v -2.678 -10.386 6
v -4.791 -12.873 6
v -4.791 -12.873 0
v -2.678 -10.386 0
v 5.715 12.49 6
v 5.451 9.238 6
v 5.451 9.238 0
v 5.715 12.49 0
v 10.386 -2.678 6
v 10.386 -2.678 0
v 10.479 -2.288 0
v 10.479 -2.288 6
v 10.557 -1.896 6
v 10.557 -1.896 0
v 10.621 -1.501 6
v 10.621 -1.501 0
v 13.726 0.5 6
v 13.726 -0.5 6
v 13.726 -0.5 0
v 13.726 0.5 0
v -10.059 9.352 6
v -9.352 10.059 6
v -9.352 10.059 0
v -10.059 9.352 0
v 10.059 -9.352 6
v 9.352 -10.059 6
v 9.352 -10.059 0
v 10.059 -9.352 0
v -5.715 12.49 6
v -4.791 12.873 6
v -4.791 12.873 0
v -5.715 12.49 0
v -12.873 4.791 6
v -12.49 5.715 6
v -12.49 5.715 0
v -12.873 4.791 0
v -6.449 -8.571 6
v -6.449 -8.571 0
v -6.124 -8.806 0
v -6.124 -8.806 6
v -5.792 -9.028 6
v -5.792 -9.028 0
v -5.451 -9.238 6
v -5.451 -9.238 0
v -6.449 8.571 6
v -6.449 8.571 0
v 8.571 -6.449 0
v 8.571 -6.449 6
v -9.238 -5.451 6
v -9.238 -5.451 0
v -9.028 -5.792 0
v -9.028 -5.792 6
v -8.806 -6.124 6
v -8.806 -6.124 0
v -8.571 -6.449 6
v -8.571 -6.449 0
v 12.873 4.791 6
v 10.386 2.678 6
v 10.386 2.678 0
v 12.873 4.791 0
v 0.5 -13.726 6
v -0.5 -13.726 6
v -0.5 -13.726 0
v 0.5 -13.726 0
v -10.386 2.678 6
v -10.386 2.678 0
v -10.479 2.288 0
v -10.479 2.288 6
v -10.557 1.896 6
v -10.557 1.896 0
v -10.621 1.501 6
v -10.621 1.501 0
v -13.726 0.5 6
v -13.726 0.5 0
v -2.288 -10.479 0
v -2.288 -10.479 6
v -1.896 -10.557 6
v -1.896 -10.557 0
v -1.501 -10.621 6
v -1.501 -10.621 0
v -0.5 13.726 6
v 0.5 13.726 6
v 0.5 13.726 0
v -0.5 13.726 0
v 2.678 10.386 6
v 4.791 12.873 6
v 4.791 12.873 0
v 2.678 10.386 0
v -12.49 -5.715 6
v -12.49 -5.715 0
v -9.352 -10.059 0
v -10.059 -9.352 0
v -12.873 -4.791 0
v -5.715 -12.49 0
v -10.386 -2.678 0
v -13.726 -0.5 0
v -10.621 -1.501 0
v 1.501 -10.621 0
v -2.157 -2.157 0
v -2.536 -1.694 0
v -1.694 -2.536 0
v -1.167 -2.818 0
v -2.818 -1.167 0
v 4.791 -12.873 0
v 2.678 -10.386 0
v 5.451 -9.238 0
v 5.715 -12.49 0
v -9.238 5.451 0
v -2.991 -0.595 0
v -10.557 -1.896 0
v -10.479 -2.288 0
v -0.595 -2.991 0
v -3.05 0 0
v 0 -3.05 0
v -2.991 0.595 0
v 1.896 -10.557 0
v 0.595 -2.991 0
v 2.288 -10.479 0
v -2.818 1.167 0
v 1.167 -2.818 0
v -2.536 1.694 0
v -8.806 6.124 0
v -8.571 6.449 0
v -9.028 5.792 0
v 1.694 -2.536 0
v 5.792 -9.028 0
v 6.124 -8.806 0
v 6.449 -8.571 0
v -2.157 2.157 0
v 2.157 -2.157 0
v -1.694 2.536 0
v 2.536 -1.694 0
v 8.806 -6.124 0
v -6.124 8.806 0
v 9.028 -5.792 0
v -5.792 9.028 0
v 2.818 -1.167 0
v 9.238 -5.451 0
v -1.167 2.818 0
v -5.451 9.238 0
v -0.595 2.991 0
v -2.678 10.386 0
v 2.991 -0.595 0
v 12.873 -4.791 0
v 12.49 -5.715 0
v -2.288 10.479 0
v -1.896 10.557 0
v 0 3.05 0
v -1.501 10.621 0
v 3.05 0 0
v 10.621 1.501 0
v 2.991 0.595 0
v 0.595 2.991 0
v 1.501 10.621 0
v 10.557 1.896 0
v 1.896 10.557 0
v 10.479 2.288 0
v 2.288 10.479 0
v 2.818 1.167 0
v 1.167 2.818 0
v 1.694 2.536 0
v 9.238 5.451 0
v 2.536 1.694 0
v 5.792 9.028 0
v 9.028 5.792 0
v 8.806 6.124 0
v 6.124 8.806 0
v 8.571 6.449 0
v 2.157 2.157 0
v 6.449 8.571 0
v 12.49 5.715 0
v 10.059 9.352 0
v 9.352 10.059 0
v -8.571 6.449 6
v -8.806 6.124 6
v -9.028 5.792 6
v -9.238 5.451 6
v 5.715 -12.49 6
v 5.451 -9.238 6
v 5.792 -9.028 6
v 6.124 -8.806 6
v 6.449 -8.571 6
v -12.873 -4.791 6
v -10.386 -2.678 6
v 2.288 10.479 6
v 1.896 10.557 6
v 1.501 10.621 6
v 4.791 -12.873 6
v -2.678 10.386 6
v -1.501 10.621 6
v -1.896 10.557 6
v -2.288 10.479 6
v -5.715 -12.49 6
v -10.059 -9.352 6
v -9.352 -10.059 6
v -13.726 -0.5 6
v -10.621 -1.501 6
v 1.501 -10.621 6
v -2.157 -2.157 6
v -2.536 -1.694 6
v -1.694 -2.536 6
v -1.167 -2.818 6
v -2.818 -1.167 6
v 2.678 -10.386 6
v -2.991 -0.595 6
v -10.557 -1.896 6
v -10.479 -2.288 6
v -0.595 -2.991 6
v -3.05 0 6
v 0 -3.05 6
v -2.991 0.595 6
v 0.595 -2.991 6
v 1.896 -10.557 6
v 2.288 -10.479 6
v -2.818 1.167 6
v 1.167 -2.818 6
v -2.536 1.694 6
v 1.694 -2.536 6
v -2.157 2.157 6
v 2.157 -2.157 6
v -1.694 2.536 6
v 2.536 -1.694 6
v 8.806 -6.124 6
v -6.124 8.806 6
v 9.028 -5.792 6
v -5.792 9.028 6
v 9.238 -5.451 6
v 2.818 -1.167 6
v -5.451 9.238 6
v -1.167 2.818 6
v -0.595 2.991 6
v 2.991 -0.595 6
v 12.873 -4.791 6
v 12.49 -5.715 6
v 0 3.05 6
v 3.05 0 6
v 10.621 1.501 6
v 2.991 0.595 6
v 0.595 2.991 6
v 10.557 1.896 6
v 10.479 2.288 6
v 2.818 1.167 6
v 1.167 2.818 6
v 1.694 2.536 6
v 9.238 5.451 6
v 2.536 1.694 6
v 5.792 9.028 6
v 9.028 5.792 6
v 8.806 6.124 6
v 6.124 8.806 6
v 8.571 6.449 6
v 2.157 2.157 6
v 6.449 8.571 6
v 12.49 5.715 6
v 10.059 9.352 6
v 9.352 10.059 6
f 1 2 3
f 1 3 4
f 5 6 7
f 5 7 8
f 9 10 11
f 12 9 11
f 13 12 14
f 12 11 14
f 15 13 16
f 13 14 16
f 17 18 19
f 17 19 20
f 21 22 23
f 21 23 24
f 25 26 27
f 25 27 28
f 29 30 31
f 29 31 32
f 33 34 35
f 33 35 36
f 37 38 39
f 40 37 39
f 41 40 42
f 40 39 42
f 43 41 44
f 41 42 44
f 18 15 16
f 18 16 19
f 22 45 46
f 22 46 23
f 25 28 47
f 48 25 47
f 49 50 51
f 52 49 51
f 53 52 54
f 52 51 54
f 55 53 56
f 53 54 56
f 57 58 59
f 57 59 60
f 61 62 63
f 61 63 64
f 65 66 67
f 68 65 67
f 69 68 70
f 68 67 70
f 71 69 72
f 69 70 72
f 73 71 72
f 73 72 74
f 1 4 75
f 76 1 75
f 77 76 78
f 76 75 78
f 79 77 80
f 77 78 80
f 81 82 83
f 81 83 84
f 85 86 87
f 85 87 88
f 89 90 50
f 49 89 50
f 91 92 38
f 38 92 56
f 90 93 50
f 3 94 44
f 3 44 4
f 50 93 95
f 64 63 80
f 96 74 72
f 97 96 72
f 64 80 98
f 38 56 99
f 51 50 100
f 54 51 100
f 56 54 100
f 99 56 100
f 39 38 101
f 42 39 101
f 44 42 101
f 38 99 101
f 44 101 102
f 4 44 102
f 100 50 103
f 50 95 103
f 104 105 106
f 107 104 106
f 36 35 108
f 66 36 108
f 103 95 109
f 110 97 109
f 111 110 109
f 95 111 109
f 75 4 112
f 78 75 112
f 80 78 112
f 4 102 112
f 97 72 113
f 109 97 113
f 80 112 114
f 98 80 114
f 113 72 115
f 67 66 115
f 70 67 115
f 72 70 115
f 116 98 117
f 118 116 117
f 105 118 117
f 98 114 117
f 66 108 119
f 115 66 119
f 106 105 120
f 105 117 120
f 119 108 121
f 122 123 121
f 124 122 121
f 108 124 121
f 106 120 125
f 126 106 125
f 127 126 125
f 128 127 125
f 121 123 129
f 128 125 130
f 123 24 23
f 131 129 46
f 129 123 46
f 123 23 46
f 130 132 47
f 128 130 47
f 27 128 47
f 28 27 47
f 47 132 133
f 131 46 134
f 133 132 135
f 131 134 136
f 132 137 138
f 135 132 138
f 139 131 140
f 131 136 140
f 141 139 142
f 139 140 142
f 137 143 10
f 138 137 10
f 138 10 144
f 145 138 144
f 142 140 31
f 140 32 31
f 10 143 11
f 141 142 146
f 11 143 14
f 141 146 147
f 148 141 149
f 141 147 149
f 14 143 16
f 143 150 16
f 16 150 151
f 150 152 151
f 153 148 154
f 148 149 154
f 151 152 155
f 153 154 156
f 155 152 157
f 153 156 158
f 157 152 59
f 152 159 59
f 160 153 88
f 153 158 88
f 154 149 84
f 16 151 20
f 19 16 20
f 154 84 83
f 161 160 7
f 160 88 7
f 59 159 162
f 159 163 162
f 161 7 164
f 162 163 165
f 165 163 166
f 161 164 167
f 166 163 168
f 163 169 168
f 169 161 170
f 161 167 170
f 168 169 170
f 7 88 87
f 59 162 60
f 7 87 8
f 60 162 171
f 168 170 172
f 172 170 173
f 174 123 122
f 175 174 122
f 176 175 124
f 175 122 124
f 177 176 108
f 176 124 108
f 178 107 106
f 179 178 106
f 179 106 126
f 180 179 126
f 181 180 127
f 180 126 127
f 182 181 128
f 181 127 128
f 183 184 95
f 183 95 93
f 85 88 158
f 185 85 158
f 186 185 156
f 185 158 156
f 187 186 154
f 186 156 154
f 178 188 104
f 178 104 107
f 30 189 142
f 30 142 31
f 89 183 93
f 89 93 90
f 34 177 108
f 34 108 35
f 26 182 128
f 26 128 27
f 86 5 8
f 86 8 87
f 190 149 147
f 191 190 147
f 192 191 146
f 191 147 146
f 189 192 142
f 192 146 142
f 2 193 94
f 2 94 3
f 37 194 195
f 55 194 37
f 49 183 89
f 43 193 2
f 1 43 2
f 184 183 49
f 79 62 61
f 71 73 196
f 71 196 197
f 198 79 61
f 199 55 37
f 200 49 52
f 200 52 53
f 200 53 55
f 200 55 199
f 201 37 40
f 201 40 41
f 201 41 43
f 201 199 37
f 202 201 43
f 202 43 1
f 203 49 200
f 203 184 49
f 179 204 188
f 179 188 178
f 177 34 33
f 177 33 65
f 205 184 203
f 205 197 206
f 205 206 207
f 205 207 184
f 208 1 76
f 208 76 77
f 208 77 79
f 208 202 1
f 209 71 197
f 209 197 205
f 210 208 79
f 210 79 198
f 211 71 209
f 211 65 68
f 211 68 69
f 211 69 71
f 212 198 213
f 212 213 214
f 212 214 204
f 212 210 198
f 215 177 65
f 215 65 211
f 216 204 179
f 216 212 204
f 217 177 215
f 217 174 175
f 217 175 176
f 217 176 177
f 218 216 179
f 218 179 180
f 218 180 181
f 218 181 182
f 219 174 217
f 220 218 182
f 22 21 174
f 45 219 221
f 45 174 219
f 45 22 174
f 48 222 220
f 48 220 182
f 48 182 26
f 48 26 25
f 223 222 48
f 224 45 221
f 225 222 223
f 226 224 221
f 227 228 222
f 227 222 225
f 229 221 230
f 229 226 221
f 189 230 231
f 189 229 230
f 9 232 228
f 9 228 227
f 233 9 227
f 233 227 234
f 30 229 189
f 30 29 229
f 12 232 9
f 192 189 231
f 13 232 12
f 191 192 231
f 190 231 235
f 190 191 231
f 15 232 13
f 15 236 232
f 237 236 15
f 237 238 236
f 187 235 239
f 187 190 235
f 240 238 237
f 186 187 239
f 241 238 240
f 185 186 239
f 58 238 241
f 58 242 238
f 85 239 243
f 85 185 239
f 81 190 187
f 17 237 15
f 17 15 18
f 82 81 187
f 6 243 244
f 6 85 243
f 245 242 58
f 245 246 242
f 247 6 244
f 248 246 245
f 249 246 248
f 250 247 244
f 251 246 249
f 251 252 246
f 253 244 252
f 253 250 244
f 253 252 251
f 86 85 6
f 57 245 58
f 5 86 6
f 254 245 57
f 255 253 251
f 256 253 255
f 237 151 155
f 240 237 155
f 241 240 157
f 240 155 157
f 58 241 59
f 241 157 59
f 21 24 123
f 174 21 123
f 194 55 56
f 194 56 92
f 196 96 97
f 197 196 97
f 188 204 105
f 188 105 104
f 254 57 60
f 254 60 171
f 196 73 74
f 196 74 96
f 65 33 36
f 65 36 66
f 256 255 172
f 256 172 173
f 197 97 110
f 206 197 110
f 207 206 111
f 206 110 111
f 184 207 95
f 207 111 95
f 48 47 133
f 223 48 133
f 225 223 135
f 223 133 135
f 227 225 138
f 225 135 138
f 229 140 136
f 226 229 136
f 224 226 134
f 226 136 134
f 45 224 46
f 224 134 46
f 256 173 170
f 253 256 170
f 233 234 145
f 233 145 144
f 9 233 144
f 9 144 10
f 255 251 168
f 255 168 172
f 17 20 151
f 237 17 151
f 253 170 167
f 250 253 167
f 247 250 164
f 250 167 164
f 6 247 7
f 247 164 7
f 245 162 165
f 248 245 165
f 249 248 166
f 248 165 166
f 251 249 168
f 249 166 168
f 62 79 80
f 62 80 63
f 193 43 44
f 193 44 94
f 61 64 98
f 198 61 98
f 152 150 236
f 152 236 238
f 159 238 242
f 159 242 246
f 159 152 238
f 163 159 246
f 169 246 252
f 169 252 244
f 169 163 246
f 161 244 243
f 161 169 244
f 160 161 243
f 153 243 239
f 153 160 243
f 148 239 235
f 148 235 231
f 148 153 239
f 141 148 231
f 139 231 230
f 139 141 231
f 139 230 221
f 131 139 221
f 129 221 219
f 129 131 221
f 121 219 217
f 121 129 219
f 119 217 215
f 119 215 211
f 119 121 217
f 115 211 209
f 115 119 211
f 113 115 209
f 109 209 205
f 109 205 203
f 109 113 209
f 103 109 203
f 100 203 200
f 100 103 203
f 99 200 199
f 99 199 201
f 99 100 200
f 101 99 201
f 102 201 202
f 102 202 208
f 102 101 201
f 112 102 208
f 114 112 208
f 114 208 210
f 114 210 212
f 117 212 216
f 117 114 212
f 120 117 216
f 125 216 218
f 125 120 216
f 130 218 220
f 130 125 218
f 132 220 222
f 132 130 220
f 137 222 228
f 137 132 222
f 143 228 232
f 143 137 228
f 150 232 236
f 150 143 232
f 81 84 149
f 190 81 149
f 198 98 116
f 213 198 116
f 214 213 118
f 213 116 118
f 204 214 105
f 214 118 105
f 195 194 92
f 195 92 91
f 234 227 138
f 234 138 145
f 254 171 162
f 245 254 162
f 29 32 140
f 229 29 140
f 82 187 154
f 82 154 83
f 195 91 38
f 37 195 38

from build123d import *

# Parameters (mm, degrees)
SKETCH1_R           = 10.72611465
SKETCH1_R_2         = 3.05
BOSS_EXTRUDE1_DEPTH = 6
BOSS_EXTRUDE2_DEPTH = 6


with BuildPart() as part:
    # Sketch1 → Boss-Extrude1 (new body)
    with BuildSketch(Plane.XY):
        Circle(SKETCH1_R)
        Circle(SKETCH1_R_2, mode=Mode.SUBTRACT)
    extrude(amount=BOSS_EXTRUDE1_DEPTH)

    # Sketch3 → Boss-Extrude2 (add)
    with BuildSketch(Plane.XY.offset(6)):
        with BuildLine():
            Line((-13.72611465, 0.5), (-13.72611465, -0.5))
            Line((-13.72611465, -0.5), (-10.620597641, -1.500813525))
            ThreePointArc((-10.620597641, -1.500813525), (-10.72611465, 0), (-10.620597641, 1.500813525))
            Line((-10.620597641, 1.500813525), (-13.72611465, 0.5))
        make_face()
        with BuildLine():
            Line((-12.872618102, 4.790816901), (-10.386489254, 2.677755861))
            ThreePointArc((-10.386489254, 2.677755861), (-9.909637788, 4.10470637), (-9.237816312, 5.450897656))
            Line((-9.237816312, 5.450897656), (-12.48993467, 5.714696433))
            Line((-12.48993467, 5.714696433), (-12.872618102, 4.790816901))
        make_face()
        with BuildLine():
            ThreePointArc((-9.237816312, -5.450897656), (-9.909637788, -4.10470637), (-10.386489254, -2.677755861))
            Line((-10.386489254, -2.677755861), (-12.872618102, -4.790816901))
            Line((-12.872618102, -4.790816901), (-12.48993467, -5.714696433))
            Line((-12.48993467, -5.714696433), (-9.237816312, -5.450897656))
        make_face()
        with BuildLine():
            Line((-10.059382139, 9.352275358), (-8.571132033, 6.448661191))
            ThreePointArc((-8.571132033, 6.448661191), (-7.584508405, 7.584508405), (-6.448661191, 8.571132033))
            Line((-6.448661191, 8.571132033), (-9.352275358, 10.059382139))
            Line((-9.352275358, 10.059382139), (-10.059382139, 9.352275358))
        make_face()
        with BuildLine():
            ThreePointArc((-6.448661191, -8.571132033), (-7.584508405, -7.584508405), (-8.571132033, -6.448661191))
            Line((-8.571132033, -6.448661191), (-10.059382139, -9.352275358))
            Line((-10.059382139, -9.352275358), (-9.352275358, -10.059382139))
            Line((-9.352275358, -10.059382139), (-6.448661191, -8.571132033))
        make_face()
        with BuildLine():
            Line((-5.714696433, 12.48993467), (-5.450897656, 9.237816312))
            ThreePointArc((-5.450897656, 9.237816312), (-4.10470637, 9.909637788), (-2.677755861, 10.386489254))
            Line((-2.677755861, 10.386489254), (-4.790816901, 12.872618102))
            Line((-4.790816901, 12.872618102), (-5.714696433, 12.48993467))
        make_face()
        with BuildLine():
            ThreePointArc((-2.677755861, -10.386489254), (-4.10470637, -9.909637788), (-5.450897656, -9.237816312))
            Line((-5.450897656, -9.237816312), (-5.714696433, -12.48993467))
            Line((-5.714696433, -12.48993467), (-4.790816901, -12.872618102))
            Line((-4.790816901, -12.872618102), (-2.677755861, -10.386489254))
        make_face()
        with BuildLine():
            Line((-0.5, 13.72611465), (-1.500813525, 10.620597641))
            ThreePointArc((-1.500813525, 10.620597641), (0, 10.72611465), (1.500813525, 10.620597641))
            Line((1.500813525, 10.620597641), (0.5, 13.72611465))
            Line((0.5, 13.72611465), (-0.5, 13.72611465))
        make_face()
        with BuildLine():
            ThreePointArc((1.500813525, -10.620597641), (0, -10.72611465), (-1.500813525, -10.620597641))
            Line((-1.500813525, -10.620597641), (-0.5, -13.72611465))
            Line((-0.5, -13.72611465), (0.5, -13.72611465))
            Line((0.5, -13.72611465), (1.500813525, -10.620597641))
        make_face()
        with BuildLine():
            Line((4.790816901, 12.872618102), (2.677755861, 10.386489254))
            ThreePointArc((2.677755861, 10.386489254), (4.10470637, 9.909637788), (5.450897656, 9.237816312))
            Line((5.450897656, 9.237816312), (5.714696433, 12.48993467))
            Line((5.714696433, 12.48993467), (4.790816901, 12.872618102))
        make_face()
        with BuildLine():
            ThreePointArc((5.450897656, -9.237816312), (4.10470637, -9.909637788), (2.677755861, -10.386489254))
            Line((2.677755861, -10.386489254), (4.790816901, -12.872618102))
            Line((4.790816901, -12.872618102), (5.714696433, -12.48993467))
            Line((5.714696433, -12.48993467), (5.450897656, -9.237816312))
        make_face()
        with BuildLine():
            Line((9.352275358, 10.059382139), (6.448661191, 8.571132033))
            ThreePointArc((6.448661191, 8.571132033), (7.584508405, 7.584508405), (8.571132033, 6.448661191))
            Line((8.571132033, 6.448661191), (10.059382139, 9.352275358))
            Line((10.059382139, 9.352275358), (9.352275358, 10.059382139))
        make_face()
        with BuildLine():
            ThreePointArc((8.571132033, -6.448661191), (7.584508405, -7.584508405), (6.448661191, -8.571132033))
            Line((6.448661191, -8.571132033), (9.352275358, -10.059382139))
            Line((9.352275358, -10.059382139), (10.059382139, -9.352275358))
            Line((10.059382139, -9.352275358), (8.571132033, -6.448661191))
        make_face()
        with BuildLine():
            Line((12.48993467, 5.714696433), (9.237816312, 5.450897656))
            ThreePointArc((9.237816312, 5.450897656), (9.909637788, 4.10470637), (10.386489254, 2.677755861))
            Line((10.386489254, 2.677755861), (12.872618102, 4.790816901))
            Line((12.872618102, 4.790816901), (12.48993467, 5.714696433))
        make_face()
        with BuildLine():
            ThreePointArc((10.386489254, -2.677755861), (9.909637788, -4.10470637), (9.237816312, -5.450897656))
            Line((9.237816312, -5.450897656), (12.48993467, -5.714696433))
            Line((12.48993467, -5.714696433), (12.872618102, -4.790816901))
            Line((12.872618102, -4.790816901), (10.386489254, -2.677755861))
        make_face()
        with BuildLine():
            Line((13.72611465, 0.5), (10.620597641, 1.500813525))
            ThreePointArc((10.620597641, 1.500813525), (10.72611465, 0), (10.620597641, -1.500813525))
            Line((10.620597641, -1.500813525), (13.72611465, -0.5))
            Line((13.72611465, -0.5), (13.72611465, 0.5))
        make_face()
    extrude(amount=-BOSS_EXTRUDE2_DEPTH)


solid = part.part
